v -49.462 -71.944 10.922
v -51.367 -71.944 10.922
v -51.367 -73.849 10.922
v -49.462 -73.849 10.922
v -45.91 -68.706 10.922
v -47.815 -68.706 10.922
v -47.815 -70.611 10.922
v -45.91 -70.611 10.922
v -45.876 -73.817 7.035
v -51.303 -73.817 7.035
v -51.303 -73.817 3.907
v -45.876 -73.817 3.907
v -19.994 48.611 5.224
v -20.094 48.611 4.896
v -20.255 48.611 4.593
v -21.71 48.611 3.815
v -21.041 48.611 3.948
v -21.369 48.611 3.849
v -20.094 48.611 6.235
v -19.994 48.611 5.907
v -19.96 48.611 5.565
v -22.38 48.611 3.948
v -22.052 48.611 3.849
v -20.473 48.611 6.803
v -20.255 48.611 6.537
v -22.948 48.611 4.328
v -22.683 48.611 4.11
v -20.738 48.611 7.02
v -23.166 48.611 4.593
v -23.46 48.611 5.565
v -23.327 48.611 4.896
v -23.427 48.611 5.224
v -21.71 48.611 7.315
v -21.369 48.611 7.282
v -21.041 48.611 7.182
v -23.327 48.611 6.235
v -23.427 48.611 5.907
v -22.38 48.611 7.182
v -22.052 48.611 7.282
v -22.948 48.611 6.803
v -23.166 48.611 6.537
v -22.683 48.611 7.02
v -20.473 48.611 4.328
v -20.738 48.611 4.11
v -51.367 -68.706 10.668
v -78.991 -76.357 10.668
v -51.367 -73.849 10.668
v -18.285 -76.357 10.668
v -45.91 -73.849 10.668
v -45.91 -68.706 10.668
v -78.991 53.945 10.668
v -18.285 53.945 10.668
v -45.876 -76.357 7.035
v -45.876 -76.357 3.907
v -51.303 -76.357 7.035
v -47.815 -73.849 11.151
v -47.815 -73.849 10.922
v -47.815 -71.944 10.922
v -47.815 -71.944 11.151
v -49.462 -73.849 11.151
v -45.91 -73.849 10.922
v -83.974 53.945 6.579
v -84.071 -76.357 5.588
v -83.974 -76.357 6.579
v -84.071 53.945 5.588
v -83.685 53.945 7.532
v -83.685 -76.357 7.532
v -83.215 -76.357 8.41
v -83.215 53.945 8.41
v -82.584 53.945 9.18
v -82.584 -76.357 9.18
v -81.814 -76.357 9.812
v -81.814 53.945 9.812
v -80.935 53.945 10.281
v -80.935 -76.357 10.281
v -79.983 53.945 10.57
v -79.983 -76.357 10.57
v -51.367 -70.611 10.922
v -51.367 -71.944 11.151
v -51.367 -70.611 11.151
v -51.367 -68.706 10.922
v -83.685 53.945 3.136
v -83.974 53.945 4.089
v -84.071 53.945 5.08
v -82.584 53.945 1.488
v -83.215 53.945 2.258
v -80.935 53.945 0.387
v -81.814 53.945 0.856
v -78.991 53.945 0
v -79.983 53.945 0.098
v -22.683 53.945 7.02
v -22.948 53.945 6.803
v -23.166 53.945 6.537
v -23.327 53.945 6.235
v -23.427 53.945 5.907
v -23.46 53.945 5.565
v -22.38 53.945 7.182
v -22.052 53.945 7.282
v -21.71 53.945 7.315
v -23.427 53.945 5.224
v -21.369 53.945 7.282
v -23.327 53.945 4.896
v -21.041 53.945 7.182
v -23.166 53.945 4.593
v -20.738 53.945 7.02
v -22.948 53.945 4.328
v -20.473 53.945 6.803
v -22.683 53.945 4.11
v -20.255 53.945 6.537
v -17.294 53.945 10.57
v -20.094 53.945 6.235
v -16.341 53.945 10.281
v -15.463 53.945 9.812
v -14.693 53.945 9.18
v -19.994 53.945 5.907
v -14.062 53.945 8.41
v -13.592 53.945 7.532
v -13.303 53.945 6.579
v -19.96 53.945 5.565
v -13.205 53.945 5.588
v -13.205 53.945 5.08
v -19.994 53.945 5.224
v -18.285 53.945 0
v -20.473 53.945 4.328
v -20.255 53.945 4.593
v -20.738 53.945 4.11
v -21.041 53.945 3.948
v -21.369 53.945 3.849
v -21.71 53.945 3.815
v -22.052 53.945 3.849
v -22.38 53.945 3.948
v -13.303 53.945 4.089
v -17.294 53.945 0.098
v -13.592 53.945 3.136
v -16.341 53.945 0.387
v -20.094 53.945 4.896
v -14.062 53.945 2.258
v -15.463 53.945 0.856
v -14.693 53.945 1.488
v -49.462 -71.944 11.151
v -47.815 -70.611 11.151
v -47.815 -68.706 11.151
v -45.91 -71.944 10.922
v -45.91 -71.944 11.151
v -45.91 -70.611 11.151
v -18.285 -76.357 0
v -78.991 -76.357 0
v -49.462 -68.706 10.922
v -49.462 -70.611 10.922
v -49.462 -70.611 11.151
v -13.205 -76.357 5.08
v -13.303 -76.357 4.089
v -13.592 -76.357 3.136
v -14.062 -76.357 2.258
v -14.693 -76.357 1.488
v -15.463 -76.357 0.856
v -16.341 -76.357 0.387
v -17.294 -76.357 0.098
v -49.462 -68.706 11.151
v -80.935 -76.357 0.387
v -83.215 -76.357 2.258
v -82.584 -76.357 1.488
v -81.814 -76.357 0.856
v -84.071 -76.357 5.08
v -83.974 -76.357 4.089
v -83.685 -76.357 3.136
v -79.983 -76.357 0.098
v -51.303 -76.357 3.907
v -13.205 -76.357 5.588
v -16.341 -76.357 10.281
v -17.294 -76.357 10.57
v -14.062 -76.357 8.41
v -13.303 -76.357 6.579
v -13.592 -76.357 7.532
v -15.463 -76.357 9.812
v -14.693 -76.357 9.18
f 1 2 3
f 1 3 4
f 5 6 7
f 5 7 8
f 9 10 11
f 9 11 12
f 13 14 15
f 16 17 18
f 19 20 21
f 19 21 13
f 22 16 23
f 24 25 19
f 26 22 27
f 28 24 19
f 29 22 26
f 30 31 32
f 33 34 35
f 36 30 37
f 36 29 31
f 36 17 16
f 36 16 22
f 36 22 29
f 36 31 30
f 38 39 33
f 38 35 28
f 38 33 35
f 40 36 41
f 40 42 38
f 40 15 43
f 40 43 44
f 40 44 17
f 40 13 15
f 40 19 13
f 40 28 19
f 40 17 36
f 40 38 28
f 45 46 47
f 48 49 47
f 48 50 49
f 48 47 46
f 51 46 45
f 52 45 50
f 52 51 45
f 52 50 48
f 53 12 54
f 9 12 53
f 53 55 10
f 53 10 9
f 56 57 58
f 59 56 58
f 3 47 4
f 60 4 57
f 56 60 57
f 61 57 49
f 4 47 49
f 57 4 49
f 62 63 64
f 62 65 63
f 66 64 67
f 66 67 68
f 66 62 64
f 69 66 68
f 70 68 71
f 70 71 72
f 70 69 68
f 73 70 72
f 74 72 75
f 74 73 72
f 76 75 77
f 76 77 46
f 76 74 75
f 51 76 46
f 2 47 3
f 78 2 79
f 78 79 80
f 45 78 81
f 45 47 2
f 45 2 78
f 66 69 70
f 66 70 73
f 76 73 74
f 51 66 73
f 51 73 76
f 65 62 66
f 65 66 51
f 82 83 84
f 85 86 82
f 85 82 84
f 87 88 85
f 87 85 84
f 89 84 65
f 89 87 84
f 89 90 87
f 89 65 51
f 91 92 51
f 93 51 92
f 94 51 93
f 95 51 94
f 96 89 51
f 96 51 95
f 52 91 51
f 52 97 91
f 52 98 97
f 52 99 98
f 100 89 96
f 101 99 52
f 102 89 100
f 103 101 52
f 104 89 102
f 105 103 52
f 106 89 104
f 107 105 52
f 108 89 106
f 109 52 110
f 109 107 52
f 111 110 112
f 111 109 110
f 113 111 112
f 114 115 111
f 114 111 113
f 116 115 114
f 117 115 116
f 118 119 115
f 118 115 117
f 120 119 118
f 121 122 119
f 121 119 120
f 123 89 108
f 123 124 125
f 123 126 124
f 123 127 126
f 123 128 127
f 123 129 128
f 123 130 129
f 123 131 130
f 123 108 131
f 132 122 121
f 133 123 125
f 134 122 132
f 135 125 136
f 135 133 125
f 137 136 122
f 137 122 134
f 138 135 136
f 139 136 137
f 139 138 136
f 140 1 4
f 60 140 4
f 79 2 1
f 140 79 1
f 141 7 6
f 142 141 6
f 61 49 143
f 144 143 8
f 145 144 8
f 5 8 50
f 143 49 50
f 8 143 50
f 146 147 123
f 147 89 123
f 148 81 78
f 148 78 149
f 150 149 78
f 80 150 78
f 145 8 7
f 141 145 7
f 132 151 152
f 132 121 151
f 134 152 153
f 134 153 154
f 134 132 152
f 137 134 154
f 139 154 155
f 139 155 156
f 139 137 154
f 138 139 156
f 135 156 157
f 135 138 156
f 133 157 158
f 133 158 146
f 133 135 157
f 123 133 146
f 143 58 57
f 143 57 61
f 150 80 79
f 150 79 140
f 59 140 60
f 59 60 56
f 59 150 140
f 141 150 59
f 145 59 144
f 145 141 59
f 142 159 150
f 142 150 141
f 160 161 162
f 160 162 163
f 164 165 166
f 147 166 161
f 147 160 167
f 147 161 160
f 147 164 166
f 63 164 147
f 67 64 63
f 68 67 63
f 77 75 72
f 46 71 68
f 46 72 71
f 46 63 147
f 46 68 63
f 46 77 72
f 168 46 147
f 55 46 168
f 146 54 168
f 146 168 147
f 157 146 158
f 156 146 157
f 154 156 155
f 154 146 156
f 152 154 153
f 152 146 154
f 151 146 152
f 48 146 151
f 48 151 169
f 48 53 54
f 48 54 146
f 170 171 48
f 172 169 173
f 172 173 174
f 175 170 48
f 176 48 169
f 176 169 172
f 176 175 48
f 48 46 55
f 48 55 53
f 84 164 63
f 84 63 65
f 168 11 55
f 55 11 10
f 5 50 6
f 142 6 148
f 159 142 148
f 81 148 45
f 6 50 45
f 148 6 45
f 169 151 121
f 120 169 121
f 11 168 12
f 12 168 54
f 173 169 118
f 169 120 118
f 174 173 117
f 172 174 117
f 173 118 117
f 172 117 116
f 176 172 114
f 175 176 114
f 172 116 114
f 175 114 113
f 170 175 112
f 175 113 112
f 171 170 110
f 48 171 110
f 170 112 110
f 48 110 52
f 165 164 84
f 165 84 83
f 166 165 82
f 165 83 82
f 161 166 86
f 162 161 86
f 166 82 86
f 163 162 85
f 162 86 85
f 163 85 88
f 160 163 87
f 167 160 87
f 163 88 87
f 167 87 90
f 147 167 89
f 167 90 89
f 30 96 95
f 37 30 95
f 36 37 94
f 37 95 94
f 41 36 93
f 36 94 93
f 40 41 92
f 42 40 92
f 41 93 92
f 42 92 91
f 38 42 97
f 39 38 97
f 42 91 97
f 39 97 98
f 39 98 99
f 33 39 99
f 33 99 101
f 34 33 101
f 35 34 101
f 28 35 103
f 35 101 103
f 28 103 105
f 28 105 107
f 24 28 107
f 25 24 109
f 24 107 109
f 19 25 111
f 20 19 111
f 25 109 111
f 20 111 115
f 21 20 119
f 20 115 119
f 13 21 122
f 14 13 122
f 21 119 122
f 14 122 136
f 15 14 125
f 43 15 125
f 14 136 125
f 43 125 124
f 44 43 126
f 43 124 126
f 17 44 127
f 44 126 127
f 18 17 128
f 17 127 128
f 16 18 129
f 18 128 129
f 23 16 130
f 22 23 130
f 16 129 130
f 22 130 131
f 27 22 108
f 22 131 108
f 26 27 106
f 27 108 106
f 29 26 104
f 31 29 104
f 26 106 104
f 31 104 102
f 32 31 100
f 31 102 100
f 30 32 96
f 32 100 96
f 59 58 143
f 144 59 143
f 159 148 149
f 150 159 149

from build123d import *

# Parameters (mm, degrees)
F0_W      = 70.866
F0_H      = 130.302
F1_DEPTH  = 10.668
F2_R      = 5.08
F3_W      = 3.556
F3_H      = 3.128736
F4_DEPTH  = 2.54
F4_FACE_W = 2.54
F4_FACE_H = 3.128736
F5_DEPTH  = 2.053641
F6_R      = 1.75
F7_DEPTH  = 5.334
F8_W      = 1.8695
F8_H      = 3.128736
F9_DEPTH  = 2.54
F10_W     = 1.905
F10_H     = 1.905
F11_DEPTH = 0.254
F12_DEPTH = 0.4826


with BuildPart() as f1:
    # F0 (on Top) → F1 (new body)
    with BuildSketch(Plane.XY):
        with Locations((-48.638468, -11.206365)):
            Rectangle(F0_W, F0_H)
    extrude(amount=F1_DEPTH)

    # F2
    f2_edges = [f1.edges().sort_by_distance(p)[0] for p in [
        (-13.205468, -11.206365, 10.668),
        (-13.205468, -11.206365, 0),
        (-84.071468, -11.206365, 0),
        (-84.071468, -11.206365, 10.668),
    ]]
    fillet(f2_edges, radius=F2_R)

    # F3 (on face) → F4 (cut)
    with BuildSketch(Plane.XZ.offset(76.357365)):
        with Locations((-51.39454, 5.471042)):
            Rectangle(F3_W, F3_H)
        with Locations((-45.784899, 5.471042)):
            Rectangle(F3_W, F3_H)
    extrude(amount=-F4_DEPTH, mode=Mode.SUBTRACT)

    # F4_face (on face) → F5 (cut, through all)
    with BuildSketch(Plane(origin=(-47.562899, -75.087365, 5.471042), x_dir=(0, 1, 0), z_dir=(1, 0, 0))):
        Rectangle(F4_FACE_W, F4_FACE_H)
    extrude(amount=-F5_DEPTH, mode=Mode.SUBTRACT)

    # F6 (on face) → F7 (cut)
    with BuildSketch(Plane(origin=(0, 53.944635, 0), x_dir=(-1, 0, 0), z_dir=(0, 1, 0))):
        with Locations((21.710483, 5.5652)):
            Circle(F6_R)
    extrude(amount=-F7_DEPTH, mode=Mode.SUBTRACT)

    # F8 (on face) → F9 (join, through all)
    with BuildSketch(Plane.XZ.offset(73.817365)):
        with Locations((-52.23779, 5.471042)):
            Rectangle(F8_W, F8_H)
        with Locations((-44.941649, 5.471042)):
            Rectangle(F8_W, F8_H)
    extrude(amount=F9_DEPTH)

    # F10 (on face) → F11 (join)
    with BuildSketch(Plane.XY.offset(10.668)):
        with Locations((-50.41425, -69.658694)):
            Rectangle(F10_W, F10_H)
        with Locations((-50.41425, -72.896037)):
            Rectangle(F10_W, F10_H)
        with Locations((-46.862685, -72.896037)):
            Rectangle(F10_W, F10_H)
        with Locations((-46.862685, -69.658694)):
            Rectangle(F10_W, F10_H)
    extrude(amount=F11_DEPTH)

    # F10 (on face) → F12 (join)
    with BuildSketch(Plane.XY.offset(10.668)):
        Polygon((-49.46175, -68.706194), (-49.46175, -70.611194), (-51.36675, -70.611194), (-51.36675, -71.943537), (-49.46175, -71.943537), (-49.46175, -73.848537), (-47.815185, -73.848537), (-47.815185, -71.943537), (-45.910185, -71.943537), (-45.910185, -70.611194), (-47.815185, -70.611194), (-47.815185, -68.706194), align=None)
    extrude(amount=F12_DEPTH)


solid = f1.part
